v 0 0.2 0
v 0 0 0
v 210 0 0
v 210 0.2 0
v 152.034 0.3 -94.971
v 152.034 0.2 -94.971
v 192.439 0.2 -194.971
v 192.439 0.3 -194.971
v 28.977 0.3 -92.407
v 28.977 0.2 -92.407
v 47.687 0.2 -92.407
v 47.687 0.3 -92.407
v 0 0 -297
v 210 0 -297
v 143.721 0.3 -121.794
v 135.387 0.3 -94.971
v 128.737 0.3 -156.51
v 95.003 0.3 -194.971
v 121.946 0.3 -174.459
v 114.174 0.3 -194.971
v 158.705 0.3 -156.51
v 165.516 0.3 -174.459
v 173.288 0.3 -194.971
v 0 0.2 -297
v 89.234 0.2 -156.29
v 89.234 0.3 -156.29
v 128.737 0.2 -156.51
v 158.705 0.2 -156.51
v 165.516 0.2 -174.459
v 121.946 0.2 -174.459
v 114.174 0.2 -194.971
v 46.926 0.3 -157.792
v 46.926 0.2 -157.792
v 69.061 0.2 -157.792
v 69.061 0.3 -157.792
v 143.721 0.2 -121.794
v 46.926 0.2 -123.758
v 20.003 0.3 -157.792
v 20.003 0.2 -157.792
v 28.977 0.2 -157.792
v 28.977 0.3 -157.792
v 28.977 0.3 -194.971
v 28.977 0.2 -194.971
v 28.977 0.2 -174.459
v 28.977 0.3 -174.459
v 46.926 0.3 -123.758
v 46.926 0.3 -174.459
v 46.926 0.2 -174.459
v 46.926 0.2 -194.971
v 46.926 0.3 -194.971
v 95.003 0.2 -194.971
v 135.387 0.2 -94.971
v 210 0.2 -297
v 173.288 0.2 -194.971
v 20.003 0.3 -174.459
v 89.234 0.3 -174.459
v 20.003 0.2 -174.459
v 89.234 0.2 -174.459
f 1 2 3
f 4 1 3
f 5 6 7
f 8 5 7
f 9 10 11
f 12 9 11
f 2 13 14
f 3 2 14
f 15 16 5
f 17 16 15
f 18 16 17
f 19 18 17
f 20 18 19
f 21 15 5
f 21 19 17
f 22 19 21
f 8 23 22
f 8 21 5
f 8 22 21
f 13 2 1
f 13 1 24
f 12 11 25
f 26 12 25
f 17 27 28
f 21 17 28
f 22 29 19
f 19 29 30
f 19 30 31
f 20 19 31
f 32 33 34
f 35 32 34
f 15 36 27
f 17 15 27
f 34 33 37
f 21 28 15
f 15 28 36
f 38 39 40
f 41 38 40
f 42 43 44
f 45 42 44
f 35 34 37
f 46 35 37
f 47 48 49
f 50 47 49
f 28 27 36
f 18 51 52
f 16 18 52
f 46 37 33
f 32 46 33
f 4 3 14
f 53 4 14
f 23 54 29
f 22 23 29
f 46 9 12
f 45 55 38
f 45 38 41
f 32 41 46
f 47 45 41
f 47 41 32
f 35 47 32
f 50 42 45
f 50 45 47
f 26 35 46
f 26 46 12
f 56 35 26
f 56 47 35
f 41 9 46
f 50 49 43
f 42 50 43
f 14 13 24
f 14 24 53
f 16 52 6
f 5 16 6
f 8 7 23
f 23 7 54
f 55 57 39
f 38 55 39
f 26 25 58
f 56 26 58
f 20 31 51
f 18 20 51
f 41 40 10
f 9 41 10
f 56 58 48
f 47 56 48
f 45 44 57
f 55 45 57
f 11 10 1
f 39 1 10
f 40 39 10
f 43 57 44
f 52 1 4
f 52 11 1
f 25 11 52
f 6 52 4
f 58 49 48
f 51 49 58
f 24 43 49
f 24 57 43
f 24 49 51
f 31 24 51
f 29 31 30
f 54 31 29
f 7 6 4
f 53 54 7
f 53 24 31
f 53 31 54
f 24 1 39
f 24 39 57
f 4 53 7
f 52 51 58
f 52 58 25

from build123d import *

# Parameters (mm, degrees)
SKETCH1_W      = 210
SKETCH1_H      = 297
EXTRUDE1_DEPTH = 0.2
EXTRUDE2_START = 0.2
EXTRUDE2_DEPTH = 0.1


# Read off the part's stored shape, not the designer's step: Extrude2
with BuildPart() as part:
    # Sketch1 → Extrude1 (new body)
    with BuildSketch(Plane(origin=(0, 0, 0), x_dir=(1, 0, 0), z_dir=(0, 1, 0))):
        with Locations((105, 148.5)):
            Rectangle(SKETCH1_W, SKETCH1_H)
    extrude(amount=EXTRUDE1_DEPTH)

    # Extrude2 outline → Extrude2 (add)
    # profile 1 of 2: a face of its own
    with BuildSketch(Plane(origin=(0, 0, 0), x_dir=(1, 0, 0), z_dir=(0, 1, 0)).offset(EXTRUDE2_START)):
        Polygon((135.38747678, 94.971472029), (152.034111396, 94.971472029), (192.438758831, 194.971472029), (173.288117806, 194.971472029), (165.515681908, 174.458651516), (121.94597037, 174.458651516), (114.173534472, 194.971472029), (95.002861396, 194.971472029), align=None)
        Polygon((158.704784472, 156.509933567), (143.720810113, 121.794388695), (128.736835755, 156.509933567), align=None, mode=Mode.SUBTRACT)
    # profile 2 of 2: a face of its own
    with BuildSketch(Plane(origin=(0, 0, 0), x_dir=(1, 0, 0), z_dir=(0, 1, 0)).offset(EXTRUDE2_START)):
        Polygon((46.925938319, 174.458651516), (46.925938319, 194.971472029), (28.97722037, 194.971472029), (28.97722037, 174.458651516), (20.002861396, 174.458651516), (20.002861396, 157.791984849), (28.97722037, 157.791984849), (28.97722037, 92.407369465), (47.687156267, 92.407369465), (89.233630626, 156.289581003), (89.233630626, 174.458651516), align=None)
        Polygon((69.061354985, 157.791984849), (46.925938319, 123.757529721), (46.925938319, 157.791984849), align=None, mode=Mode.SUBTRACT)
    extrude(amount=EXTRUDE2_DEPTH)


solid = part.part
